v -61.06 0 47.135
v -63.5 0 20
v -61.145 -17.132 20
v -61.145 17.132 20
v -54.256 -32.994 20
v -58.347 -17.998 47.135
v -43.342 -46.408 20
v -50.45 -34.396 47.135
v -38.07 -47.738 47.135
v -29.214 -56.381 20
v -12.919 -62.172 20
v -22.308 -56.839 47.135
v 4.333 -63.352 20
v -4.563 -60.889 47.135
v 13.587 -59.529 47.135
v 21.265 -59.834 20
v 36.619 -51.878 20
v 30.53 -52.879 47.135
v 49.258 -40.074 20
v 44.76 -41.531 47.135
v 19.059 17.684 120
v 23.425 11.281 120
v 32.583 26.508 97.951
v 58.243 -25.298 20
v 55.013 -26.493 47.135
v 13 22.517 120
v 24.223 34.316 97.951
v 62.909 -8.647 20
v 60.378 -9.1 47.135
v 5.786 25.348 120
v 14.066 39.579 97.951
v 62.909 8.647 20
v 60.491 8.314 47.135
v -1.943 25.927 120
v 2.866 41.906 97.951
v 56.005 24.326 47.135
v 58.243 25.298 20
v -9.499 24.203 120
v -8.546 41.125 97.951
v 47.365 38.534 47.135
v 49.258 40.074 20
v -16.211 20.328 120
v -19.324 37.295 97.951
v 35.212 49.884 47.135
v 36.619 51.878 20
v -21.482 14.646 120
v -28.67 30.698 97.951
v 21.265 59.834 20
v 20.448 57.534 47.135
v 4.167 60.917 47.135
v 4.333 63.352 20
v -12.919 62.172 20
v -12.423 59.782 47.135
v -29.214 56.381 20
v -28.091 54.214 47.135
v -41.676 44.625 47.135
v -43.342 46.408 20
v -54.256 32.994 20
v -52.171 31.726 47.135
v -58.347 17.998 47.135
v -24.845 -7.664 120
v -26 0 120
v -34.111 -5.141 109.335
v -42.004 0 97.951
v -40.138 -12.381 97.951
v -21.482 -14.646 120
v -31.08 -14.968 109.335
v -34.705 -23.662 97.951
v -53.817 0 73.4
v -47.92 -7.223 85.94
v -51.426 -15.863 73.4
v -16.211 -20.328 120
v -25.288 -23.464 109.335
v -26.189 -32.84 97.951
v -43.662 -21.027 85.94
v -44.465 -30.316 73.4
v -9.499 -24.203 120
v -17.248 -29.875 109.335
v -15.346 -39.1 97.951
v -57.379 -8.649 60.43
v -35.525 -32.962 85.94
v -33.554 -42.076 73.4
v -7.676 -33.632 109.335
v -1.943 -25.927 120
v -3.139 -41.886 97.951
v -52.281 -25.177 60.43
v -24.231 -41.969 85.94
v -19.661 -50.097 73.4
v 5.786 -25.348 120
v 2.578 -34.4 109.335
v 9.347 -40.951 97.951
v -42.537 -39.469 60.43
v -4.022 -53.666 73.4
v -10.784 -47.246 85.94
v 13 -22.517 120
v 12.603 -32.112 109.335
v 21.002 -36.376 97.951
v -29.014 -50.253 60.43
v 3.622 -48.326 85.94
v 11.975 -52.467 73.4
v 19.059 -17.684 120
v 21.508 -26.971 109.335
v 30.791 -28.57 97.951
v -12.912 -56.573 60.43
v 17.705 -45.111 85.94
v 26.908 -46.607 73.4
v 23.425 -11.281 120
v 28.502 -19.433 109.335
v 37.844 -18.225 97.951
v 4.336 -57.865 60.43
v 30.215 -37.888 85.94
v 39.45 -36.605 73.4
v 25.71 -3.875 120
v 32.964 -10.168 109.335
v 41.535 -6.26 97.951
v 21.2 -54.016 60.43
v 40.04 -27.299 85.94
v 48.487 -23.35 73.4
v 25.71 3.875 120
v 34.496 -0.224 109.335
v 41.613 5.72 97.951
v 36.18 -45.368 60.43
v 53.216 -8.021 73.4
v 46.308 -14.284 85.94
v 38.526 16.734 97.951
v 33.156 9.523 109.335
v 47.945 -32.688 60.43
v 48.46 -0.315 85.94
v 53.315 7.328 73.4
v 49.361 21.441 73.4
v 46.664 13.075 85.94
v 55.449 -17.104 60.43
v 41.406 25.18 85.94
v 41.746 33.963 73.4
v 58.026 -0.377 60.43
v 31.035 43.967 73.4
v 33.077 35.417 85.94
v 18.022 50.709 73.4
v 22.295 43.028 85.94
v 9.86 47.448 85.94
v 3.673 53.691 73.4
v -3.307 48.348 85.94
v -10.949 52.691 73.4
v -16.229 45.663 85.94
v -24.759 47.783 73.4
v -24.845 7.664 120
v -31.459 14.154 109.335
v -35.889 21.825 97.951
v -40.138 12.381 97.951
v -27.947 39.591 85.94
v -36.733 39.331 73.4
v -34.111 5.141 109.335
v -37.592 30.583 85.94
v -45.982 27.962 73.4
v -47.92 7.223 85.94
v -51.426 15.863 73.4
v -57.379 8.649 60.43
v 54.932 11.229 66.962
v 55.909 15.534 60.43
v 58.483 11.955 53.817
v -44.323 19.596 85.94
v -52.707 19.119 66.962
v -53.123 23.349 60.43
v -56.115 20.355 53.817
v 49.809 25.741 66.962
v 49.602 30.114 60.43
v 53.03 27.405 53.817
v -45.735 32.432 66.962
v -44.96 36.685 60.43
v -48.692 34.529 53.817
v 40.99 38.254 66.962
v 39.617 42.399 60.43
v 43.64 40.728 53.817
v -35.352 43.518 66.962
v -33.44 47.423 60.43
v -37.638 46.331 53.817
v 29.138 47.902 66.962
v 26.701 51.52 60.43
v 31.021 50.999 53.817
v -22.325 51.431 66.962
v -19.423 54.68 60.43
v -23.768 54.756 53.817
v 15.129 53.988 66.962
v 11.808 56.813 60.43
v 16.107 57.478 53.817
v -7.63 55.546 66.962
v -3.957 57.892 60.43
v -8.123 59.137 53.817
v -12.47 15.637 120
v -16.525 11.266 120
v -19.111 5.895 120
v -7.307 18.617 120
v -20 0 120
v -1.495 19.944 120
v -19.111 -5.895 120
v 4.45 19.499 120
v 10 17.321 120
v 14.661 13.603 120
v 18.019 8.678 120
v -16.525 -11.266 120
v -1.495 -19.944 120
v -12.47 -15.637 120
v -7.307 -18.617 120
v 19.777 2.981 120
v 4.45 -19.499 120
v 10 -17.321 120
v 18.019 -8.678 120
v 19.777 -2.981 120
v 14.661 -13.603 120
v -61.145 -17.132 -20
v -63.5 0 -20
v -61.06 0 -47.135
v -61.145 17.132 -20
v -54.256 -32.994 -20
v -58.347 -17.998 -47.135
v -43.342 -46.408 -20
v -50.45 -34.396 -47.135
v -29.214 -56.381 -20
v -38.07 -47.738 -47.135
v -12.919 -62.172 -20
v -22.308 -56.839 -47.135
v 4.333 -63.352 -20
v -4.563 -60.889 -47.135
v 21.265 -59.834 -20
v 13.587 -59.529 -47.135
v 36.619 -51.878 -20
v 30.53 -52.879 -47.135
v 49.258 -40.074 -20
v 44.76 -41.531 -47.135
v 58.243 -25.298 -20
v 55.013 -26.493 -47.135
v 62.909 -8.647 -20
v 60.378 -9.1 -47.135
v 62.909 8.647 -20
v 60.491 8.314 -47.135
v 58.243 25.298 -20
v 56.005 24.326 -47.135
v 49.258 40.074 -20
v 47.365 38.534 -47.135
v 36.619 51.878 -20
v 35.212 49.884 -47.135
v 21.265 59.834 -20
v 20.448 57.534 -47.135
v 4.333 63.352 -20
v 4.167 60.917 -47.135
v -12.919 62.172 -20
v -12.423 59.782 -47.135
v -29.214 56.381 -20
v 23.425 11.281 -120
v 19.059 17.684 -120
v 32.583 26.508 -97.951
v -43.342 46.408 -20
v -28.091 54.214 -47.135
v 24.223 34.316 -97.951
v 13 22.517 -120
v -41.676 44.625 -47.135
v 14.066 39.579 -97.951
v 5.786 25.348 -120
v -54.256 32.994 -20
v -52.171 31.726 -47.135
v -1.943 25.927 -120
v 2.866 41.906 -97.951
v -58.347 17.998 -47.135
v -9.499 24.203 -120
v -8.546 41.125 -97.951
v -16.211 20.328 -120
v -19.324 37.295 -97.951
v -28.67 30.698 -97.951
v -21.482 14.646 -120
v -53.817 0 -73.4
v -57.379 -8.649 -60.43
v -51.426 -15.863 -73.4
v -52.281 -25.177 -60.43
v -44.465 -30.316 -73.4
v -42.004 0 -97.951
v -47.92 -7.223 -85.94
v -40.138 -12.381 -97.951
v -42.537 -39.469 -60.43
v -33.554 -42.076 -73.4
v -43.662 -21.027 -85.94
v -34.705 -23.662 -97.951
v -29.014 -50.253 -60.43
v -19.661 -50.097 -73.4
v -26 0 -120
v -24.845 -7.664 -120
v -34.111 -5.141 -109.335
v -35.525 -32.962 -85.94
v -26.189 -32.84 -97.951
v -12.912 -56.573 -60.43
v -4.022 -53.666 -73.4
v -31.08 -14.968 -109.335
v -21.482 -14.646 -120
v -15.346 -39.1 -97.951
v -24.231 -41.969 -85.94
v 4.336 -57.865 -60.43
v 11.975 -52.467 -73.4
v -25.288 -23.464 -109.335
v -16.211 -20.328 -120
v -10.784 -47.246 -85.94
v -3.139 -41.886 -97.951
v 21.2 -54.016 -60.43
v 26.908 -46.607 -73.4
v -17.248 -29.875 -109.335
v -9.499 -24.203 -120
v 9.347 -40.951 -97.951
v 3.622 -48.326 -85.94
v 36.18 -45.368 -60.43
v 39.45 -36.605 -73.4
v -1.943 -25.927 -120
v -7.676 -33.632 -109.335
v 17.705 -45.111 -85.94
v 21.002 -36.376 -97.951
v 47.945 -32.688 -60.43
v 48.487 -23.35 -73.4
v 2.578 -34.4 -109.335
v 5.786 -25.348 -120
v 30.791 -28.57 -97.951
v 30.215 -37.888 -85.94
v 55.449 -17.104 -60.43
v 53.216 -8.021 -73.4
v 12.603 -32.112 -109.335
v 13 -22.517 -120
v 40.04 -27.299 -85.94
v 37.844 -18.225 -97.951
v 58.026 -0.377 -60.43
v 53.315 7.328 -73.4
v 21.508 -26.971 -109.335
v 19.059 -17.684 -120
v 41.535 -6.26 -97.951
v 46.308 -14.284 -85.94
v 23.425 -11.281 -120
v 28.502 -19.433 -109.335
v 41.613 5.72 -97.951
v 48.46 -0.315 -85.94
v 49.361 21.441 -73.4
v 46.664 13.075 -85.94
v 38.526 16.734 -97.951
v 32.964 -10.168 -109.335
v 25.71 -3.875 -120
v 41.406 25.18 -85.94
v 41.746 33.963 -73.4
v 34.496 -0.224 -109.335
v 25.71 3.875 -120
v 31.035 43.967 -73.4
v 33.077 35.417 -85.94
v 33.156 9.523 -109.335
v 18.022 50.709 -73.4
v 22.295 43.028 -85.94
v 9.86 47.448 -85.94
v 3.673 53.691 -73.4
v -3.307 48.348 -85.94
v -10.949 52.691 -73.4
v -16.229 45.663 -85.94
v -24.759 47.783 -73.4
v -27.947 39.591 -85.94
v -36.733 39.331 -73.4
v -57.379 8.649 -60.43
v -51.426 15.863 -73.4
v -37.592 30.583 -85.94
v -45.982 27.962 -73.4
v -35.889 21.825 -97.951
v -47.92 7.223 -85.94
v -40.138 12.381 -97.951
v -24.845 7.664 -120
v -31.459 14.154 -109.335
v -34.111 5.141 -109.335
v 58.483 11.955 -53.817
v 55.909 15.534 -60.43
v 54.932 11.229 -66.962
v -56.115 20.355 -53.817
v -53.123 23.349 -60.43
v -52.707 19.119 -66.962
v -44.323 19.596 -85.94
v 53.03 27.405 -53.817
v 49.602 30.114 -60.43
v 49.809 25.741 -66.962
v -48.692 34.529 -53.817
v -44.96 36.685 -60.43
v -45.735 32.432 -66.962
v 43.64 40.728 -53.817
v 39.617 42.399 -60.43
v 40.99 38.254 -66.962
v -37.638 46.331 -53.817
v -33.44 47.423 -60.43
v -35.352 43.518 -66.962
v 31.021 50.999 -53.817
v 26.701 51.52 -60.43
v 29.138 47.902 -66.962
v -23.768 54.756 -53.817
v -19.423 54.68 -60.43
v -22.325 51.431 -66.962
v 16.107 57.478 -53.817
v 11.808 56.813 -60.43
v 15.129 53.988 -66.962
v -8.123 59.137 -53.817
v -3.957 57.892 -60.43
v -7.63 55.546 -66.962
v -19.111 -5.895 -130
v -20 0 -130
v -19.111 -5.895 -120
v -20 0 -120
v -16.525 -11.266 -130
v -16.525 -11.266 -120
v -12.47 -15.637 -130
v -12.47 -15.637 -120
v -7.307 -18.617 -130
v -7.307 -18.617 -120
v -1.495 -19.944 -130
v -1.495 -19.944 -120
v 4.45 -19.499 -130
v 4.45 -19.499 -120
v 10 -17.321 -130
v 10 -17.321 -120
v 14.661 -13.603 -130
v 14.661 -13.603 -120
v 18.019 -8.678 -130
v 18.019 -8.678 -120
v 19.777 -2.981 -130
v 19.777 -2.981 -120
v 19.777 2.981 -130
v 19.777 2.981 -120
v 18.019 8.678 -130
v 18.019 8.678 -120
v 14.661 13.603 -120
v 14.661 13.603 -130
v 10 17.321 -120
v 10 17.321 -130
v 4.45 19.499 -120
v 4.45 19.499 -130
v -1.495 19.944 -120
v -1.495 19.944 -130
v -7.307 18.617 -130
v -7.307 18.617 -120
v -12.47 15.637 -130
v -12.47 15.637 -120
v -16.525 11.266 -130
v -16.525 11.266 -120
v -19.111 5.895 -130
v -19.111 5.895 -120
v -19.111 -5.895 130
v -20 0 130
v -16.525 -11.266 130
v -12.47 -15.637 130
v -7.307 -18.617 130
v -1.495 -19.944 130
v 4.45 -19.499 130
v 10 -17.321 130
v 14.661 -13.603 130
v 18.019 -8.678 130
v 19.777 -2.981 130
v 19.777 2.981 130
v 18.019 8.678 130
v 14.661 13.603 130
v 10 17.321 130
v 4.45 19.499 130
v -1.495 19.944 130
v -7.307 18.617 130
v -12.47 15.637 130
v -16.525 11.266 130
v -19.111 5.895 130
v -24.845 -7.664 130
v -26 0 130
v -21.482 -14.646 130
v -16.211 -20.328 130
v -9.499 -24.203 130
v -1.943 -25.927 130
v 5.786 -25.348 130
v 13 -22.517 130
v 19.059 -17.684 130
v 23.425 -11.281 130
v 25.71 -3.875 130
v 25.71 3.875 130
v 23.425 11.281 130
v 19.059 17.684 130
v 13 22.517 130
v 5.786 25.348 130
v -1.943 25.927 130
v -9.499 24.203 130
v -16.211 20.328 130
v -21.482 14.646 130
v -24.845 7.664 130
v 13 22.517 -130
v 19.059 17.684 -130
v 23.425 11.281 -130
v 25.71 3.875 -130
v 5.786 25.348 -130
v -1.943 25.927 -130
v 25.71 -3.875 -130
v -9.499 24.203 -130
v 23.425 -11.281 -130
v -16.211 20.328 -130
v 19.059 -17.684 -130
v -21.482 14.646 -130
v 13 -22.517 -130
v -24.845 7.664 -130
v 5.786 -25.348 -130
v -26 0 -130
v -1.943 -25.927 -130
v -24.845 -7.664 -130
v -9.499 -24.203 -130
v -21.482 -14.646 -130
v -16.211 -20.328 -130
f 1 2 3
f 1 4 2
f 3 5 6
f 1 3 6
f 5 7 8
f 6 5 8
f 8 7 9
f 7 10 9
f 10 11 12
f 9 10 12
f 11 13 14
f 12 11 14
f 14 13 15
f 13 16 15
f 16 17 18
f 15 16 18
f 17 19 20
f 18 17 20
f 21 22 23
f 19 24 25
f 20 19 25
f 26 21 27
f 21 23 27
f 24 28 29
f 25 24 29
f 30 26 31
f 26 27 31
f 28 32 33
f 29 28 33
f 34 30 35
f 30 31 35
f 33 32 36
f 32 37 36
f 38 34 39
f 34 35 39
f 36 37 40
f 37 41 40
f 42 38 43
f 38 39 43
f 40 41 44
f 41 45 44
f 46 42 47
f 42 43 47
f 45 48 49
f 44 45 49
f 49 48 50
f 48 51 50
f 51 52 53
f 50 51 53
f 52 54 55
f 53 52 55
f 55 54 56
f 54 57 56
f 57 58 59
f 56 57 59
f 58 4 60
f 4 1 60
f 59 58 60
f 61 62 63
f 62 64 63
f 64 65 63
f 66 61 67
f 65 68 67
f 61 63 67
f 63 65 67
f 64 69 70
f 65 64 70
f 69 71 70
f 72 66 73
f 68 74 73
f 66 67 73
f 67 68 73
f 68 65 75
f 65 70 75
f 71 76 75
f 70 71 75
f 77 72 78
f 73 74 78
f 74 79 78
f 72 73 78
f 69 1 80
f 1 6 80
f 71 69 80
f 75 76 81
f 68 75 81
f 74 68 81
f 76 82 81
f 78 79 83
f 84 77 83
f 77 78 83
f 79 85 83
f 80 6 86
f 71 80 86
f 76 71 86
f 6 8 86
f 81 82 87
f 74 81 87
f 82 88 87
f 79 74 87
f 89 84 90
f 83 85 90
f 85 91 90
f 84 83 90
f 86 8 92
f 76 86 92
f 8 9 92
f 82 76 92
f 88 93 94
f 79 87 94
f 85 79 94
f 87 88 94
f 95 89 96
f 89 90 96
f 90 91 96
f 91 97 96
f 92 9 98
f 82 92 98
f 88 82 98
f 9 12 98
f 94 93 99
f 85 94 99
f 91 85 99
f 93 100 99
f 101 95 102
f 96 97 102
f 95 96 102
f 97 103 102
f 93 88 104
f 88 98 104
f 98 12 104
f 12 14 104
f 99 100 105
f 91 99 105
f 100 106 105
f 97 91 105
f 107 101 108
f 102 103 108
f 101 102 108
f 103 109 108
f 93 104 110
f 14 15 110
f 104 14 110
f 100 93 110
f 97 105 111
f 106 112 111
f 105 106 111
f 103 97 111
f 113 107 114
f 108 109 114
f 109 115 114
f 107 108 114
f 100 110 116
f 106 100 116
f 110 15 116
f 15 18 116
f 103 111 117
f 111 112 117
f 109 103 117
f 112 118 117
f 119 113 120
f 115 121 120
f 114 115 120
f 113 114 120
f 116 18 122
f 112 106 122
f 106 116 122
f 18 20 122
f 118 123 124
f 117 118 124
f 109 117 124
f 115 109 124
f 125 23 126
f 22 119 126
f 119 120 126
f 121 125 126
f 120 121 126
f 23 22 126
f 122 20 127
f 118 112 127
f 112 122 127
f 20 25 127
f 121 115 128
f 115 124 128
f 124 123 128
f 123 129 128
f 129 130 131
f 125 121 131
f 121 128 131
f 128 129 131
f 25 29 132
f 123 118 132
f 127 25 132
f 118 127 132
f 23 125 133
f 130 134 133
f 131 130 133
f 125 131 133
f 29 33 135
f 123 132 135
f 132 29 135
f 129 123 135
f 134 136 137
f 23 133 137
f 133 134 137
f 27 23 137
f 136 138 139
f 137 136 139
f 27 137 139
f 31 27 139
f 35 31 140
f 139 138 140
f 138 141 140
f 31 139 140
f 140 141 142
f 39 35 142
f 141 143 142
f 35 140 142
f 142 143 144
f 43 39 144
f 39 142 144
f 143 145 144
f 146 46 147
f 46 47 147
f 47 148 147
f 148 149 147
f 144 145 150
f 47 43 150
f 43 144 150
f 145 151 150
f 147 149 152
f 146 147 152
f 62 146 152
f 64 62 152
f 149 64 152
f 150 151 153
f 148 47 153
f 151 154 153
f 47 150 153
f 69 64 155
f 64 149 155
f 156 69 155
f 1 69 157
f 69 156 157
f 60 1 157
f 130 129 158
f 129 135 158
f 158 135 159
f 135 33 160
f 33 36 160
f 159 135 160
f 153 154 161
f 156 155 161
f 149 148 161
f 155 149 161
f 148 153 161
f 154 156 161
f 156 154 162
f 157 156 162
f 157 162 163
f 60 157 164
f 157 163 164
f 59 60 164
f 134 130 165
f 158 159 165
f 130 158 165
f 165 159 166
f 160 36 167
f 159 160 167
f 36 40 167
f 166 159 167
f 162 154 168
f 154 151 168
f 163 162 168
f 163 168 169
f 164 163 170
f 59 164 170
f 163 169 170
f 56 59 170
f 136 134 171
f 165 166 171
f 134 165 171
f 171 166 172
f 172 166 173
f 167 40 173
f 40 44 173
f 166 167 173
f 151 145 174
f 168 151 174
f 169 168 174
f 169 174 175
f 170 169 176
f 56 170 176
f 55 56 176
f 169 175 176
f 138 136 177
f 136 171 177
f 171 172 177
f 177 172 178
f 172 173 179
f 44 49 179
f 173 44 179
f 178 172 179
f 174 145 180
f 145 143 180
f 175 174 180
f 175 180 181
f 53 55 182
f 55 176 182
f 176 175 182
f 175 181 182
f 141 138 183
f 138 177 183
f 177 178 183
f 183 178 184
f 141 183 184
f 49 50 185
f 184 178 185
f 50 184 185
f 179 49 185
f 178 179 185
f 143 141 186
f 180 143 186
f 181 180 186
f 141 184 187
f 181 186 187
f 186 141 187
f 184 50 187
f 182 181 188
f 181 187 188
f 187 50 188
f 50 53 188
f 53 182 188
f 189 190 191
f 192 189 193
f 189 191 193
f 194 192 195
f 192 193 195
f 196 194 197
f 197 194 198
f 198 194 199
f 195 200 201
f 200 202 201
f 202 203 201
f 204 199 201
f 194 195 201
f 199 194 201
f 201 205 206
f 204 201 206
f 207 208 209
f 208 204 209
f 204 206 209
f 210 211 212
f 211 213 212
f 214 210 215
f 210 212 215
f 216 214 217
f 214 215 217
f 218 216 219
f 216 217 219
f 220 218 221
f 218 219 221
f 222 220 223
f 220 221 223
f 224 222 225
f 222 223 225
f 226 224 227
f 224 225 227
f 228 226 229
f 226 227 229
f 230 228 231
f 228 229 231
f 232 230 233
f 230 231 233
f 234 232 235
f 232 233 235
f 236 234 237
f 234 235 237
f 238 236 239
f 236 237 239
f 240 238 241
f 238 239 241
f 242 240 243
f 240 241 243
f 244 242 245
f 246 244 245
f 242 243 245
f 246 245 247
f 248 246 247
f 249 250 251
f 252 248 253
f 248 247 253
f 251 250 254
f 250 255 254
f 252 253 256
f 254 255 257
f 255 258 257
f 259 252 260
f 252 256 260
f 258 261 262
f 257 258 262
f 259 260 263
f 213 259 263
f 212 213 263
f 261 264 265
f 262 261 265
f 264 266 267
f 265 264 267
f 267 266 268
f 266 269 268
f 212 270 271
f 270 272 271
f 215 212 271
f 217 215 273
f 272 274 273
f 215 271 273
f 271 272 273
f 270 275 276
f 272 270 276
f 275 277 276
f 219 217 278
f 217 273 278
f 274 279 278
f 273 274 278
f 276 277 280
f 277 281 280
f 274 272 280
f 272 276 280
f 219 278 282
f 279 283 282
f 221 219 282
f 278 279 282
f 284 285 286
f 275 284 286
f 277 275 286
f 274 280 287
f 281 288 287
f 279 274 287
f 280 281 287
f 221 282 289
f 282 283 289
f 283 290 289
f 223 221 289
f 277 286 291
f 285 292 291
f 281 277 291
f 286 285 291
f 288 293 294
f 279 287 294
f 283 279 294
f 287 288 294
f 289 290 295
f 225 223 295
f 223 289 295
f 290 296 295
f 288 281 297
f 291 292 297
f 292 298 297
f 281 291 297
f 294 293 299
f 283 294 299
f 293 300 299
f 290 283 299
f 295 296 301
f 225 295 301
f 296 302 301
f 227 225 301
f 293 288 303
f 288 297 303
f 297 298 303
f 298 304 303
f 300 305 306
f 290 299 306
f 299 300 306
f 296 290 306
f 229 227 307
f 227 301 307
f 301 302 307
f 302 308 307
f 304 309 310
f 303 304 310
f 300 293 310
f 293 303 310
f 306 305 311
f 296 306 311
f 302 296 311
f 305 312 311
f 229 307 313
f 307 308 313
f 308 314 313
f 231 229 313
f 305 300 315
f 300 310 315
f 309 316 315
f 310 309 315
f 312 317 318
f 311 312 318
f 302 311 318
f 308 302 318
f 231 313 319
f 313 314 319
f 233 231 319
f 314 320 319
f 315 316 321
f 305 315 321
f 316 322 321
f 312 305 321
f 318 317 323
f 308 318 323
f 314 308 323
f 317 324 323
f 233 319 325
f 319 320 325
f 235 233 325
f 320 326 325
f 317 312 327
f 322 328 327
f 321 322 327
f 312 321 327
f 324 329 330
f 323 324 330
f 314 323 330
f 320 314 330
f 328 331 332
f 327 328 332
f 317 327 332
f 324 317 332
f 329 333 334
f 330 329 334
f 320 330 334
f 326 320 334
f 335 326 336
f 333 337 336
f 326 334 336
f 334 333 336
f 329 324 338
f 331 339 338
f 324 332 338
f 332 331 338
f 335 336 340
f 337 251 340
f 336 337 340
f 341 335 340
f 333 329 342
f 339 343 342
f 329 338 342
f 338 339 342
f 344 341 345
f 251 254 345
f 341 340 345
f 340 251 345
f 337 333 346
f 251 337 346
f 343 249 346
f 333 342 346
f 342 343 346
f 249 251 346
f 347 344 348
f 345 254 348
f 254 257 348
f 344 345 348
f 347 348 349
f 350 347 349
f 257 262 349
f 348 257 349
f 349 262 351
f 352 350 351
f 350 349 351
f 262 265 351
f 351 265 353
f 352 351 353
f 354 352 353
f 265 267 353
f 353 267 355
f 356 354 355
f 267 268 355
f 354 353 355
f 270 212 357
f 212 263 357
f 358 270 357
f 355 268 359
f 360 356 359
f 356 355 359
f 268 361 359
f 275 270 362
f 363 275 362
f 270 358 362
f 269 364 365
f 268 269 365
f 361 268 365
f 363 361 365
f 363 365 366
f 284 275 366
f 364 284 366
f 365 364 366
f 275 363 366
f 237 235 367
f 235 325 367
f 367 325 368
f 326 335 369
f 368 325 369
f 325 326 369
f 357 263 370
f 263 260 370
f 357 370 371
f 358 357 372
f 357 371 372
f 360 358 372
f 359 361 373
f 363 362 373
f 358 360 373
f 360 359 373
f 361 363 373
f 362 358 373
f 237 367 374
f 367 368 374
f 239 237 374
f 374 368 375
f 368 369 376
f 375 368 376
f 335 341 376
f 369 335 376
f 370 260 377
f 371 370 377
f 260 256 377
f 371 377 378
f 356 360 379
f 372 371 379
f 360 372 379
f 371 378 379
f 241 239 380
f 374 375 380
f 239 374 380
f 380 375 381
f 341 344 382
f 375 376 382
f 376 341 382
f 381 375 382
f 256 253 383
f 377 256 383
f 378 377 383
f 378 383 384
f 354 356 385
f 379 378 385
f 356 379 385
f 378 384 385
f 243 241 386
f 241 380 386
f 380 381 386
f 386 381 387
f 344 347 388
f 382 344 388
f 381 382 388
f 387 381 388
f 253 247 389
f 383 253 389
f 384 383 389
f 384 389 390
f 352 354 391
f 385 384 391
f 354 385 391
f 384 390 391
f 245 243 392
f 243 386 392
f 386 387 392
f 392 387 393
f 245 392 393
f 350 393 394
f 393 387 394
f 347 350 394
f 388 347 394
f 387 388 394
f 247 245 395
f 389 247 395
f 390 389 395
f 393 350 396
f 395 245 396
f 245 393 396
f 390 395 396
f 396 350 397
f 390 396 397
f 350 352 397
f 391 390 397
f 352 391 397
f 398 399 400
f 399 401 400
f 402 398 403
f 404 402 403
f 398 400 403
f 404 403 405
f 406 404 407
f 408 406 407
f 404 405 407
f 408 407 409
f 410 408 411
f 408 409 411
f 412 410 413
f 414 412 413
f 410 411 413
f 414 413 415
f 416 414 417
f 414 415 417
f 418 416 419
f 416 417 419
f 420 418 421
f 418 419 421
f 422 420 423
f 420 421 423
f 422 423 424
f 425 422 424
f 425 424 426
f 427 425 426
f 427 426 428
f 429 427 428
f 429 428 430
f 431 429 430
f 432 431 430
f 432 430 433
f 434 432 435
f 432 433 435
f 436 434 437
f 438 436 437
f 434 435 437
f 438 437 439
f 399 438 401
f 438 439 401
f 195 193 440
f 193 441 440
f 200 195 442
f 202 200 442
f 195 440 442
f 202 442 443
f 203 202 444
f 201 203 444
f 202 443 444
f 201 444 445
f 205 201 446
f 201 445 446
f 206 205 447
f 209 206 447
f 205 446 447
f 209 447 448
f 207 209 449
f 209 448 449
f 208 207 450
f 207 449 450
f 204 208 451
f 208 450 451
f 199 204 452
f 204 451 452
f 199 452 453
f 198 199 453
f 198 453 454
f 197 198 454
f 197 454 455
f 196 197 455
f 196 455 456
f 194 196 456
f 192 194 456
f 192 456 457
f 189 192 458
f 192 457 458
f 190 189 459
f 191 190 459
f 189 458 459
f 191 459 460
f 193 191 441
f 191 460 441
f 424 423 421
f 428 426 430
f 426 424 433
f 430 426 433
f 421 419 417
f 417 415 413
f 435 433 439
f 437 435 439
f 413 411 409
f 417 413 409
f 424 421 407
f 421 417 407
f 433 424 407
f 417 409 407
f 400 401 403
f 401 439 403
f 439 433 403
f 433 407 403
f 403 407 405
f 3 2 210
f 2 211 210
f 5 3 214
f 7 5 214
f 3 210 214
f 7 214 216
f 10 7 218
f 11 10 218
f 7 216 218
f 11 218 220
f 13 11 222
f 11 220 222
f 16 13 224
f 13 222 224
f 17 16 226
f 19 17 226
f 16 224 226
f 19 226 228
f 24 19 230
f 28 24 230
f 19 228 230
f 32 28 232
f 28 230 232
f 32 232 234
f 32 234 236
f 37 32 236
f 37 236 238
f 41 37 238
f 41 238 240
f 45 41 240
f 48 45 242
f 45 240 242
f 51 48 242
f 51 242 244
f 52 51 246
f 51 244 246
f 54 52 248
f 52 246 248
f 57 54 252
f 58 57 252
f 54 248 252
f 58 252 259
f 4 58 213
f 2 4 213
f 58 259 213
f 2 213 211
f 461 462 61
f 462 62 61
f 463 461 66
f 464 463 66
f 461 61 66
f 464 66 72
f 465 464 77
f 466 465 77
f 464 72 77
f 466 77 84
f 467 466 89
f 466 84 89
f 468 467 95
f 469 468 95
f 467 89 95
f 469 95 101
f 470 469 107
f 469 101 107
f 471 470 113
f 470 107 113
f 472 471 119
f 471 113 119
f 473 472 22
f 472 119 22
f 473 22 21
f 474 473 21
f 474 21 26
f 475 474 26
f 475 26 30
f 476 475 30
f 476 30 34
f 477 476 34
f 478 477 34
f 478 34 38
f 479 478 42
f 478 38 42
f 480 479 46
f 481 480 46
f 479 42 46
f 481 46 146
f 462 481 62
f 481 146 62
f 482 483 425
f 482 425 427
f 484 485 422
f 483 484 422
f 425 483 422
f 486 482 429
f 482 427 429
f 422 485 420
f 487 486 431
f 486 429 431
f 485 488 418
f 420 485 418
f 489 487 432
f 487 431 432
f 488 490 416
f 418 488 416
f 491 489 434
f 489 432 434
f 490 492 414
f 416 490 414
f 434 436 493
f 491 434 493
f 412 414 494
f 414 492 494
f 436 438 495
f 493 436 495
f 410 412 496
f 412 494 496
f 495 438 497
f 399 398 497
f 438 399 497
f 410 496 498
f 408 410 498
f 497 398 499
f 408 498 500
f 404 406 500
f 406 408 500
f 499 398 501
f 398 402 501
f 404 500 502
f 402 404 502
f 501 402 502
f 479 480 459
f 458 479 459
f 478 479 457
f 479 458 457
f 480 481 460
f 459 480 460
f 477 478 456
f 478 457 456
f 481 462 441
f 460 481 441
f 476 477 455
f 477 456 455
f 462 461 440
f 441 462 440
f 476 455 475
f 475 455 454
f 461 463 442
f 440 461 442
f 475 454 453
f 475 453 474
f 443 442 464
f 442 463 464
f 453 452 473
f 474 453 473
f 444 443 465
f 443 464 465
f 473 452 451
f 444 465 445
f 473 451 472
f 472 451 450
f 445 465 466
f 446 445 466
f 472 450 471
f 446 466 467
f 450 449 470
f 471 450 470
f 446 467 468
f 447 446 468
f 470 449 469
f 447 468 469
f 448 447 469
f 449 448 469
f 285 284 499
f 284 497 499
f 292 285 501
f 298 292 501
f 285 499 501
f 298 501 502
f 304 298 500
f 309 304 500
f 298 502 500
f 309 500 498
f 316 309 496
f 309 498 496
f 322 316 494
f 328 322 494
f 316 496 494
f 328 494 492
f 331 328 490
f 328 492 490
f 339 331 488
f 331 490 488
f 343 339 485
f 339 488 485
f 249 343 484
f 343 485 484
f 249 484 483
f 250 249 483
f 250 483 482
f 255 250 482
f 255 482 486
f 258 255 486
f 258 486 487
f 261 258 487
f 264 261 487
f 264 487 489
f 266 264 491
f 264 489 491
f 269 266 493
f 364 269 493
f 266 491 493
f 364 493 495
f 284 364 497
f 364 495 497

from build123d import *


with BuildPart() as part:
    # Sketch2 → Revolve1 (revolve)
    with BuildSketch(Plane(origin=(0, 0, 0), x_dir=(1, 0, 0), z_dir=(0, 1, 0))):
        with BuildLine():
            Line((-20, 130), (-20, 120))
            Line((-20, 120), (0, 120))
            Line((0, 120), (0, -120))
            Line((0, -120), (-20, -120))
            Line((-20, -120), (-20, -130))
            Line((-20, -130), (-26, -130))
            Line((-26, -130), (-26, -120))
            ThreePointArc((-26, -120), (-53.816729089, -73.400023408), (-63.5, -20))
            Line((-63.5, -20), (-63.5, 20))
            ThreePointArc((-63.5, 20), (-53.816729089, 73.400023408), (-26, 120))
            Line((-26, 120), (-26, 130))
            Line((-26, 130), (-20, 130))
        make_face()
    revolve(axis=Axis((0, 0, -130), (0, 0, 1)))


solid = part.part
